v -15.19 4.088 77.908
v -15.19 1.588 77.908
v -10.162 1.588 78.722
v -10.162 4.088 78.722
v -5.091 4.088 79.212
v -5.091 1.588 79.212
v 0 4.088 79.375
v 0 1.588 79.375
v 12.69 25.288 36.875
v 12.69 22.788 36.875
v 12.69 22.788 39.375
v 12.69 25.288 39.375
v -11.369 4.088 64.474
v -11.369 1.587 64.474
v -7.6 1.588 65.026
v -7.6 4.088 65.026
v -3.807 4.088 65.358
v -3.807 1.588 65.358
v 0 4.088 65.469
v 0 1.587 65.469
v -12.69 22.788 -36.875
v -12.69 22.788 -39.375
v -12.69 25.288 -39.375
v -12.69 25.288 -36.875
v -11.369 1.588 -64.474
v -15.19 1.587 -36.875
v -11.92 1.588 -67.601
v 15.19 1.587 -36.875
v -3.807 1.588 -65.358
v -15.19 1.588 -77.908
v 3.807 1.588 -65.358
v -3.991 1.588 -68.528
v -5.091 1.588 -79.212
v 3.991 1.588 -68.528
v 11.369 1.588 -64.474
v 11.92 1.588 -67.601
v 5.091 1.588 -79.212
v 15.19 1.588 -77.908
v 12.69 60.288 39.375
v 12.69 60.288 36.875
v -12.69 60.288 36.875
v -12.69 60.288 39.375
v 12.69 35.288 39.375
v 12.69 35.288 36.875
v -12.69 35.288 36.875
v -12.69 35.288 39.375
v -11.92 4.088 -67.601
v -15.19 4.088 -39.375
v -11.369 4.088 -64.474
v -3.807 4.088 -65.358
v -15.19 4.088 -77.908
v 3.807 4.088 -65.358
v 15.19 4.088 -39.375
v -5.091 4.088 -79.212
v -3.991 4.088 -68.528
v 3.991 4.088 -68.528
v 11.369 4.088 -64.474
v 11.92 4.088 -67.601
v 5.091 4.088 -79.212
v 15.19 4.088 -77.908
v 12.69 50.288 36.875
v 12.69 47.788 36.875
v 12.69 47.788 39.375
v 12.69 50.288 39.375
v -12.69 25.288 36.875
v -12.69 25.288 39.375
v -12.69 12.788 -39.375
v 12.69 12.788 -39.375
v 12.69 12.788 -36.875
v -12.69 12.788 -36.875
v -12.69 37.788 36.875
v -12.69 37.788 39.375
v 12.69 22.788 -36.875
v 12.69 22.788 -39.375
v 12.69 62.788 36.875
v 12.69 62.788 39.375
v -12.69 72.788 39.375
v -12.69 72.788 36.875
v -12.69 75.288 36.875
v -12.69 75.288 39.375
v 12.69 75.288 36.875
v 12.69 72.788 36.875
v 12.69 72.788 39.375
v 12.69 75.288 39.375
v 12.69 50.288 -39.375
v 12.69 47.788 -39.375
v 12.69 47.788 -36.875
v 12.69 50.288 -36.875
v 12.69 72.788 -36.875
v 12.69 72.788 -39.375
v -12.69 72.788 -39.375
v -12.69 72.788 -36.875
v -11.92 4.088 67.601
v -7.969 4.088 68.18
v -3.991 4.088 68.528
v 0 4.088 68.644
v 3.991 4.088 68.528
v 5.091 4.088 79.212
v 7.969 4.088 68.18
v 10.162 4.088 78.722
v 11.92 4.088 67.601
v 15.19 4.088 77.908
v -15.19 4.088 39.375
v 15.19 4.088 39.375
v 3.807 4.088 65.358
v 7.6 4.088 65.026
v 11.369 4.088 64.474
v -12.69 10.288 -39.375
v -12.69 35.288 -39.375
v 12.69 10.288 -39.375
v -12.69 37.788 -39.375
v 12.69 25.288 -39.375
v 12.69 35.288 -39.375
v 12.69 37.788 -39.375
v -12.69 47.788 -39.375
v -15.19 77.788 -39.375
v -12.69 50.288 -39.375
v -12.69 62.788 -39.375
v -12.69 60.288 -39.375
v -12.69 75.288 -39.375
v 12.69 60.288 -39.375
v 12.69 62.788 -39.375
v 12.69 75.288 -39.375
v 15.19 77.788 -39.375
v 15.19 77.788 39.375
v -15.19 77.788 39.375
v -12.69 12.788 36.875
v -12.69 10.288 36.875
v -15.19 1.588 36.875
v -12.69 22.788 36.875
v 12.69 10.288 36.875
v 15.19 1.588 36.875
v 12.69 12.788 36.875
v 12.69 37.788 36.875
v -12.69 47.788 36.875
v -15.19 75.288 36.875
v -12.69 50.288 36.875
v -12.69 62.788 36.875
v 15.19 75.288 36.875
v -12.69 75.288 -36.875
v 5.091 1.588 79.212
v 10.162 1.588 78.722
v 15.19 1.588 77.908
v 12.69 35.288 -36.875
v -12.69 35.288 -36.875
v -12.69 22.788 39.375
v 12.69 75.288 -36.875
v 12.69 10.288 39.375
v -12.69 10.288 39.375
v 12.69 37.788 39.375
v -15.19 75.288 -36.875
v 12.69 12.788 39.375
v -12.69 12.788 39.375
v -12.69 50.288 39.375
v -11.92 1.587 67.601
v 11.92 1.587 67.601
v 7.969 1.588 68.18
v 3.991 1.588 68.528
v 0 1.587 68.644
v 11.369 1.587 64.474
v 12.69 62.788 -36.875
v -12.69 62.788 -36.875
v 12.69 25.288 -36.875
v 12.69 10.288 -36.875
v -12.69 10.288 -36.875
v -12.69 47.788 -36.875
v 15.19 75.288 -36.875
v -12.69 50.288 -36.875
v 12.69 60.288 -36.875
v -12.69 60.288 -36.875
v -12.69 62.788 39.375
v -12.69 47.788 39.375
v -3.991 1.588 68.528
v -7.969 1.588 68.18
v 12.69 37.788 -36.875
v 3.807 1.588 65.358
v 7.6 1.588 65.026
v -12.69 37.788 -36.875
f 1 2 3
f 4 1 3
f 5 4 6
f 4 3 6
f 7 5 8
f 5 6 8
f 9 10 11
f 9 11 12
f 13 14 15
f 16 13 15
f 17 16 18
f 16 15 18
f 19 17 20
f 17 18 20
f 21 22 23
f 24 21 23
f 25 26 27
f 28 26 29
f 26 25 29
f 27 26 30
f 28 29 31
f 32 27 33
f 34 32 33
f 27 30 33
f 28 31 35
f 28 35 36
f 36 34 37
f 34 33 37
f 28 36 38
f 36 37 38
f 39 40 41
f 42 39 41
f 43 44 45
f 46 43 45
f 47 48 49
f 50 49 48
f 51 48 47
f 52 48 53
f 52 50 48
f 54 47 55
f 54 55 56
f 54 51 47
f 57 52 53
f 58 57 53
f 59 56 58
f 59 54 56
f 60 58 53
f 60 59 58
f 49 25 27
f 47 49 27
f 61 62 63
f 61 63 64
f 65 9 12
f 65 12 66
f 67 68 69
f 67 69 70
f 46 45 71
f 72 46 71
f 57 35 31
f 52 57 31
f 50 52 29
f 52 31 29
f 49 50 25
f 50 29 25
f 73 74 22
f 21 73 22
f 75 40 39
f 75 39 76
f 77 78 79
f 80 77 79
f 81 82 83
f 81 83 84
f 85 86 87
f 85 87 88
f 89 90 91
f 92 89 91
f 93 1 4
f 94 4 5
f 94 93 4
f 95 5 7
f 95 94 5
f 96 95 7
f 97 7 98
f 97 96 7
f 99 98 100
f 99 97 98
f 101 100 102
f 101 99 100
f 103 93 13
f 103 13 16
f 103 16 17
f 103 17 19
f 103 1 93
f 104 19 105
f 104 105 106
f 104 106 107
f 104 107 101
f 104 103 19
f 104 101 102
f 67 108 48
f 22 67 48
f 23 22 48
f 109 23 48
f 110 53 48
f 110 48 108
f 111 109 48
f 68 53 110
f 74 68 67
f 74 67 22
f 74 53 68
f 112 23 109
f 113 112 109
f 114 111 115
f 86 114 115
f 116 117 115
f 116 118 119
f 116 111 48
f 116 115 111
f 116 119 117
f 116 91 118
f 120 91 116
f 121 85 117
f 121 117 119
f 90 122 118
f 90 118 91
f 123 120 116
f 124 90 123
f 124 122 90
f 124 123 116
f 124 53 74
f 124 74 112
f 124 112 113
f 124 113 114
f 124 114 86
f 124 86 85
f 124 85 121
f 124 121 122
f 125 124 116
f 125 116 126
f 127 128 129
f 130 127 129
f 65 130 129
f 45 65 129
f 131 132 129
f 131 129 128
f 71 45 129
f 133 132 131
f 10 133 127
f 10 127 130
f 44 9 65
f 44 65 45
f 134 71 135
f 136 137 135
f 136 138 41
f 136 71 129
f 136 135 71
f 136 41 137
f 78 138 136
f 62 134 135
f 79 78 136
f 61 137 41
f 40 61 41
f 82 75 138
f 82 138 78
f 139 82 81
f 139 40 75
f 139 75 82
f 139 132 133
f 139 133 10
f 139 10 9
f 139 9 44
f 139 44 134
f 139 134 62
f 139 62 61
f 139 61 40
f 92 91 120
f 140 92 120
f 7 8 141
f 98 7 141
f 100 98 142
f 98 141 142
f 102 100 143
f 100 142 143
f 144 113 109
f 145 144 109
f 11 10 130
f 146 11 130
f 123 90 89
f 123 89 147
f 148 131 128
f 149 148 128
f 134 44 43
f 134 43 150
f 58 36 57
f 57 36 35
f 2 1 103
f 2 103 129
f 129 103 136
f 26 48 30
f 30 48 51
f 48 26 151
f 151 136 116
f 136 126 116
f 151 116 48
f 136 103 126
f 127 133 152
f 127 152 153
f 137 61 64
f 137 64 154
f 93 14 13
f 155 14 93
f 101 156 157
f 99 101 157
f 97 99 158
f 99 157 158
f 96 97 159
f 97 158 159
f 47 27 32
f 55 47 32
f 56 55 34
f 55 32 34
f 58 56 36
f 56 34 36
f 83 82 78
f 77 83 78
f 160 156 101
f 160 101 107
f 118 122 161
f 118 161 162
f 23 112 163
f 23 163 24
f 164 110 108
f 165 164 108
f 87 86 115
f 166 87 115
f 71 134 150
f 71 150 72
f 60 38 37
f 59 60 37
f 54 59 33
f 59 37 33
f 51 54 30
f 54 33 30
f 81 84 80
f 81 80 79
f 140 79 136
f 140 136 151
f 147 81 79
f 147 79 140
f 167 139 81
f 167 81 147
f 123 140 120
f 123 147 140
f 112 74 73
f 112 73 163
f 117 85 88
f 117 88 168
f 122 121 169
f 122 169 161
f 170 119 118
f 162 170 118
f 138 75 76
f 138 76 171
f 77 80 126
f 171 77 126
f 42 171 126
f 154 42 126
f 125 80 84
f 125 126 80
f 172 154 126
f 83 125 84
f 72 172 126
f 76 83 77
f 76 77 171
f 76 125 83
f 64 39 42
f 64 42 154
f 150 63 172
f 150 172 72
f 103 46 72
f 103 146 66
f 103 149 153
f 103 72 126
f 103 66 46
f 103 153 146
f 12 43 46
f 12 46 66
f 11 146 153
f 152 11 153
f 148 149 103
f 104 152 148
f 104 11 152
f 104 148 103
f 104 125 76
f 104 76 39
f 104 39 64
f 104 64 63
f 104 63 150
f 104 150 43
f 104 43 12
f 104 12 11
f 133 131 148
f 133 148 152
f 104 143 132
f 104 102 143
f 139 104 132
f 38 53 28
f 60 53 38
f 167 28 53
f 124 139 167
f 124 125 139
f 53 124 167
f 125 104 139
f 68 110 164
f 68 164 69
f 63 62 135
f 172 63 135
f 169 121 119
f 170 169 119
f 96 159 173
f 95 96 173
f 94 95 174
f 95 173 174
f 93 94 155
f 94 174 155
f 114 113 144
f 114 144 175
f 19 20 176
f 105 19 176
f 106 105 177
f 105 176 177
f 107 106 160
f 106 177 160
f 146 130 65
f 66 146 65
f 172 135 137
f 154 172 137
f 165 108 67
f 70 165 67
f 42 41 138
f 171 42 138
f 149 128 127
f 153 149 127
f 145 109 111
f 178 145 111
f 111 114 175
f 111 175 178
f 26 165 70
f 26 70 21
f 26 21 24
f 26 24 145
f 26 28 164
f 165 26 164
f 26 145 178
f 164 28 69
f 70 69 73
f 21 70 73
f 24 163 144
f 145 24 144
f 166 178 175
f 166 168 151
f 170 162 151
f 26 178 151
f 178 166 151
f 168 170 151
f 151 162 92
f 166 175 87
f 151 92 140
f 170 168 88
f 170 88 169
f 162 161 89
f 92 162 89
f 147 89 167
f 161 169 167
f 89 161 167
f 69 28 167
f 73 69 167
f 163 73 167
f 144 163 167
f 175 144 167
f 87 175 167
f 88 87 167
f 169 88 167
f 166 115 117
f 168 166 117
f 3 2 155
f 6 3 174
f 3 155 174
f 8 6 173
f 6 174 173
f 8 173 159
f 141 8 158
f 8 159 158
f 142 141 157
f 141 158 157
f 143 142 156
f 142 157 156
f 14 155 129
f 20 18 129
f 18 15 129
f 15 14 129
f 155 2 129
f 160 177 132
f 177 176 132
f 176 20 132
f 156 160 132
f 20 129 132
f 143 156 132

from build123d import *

# Parameters (mm, degrees)
SKETCH1_R            = 1.5875
BOSS_EXTRUDE5_DEPTH  = 1.5875
FILLET2_R            = 2.54
FILLET3_R            = 2.54
FILLET4_R            = 5.08
CUT_EXTRUDE1_START   = -2.54
SKETCH2_R            = 2.38125
SKETCH2_R_2          = 1.5875
CUT_EXTRUDE1_DEPTH   = 2.54
SKETCH3_R            = 1.5875
CUT_EXTRUDE2_DEPTH   = 2.54
CUT_EXTRUDE3_DEPTH   = 2.54
SKETCH5_W            = 15
SKETCH5_H            = 34.925
CUT_EXTRUDE4_DEPTH   = 109.650407999
FILLET5_R            = 7.62
FILLET6_R            = 7.62
BOSS_EXTRUDE6_START  = -1.5875
BOSS_EXTRUDE6_DEPTH  = 1.5875
SKETCH7_R            = 79.375
CUT_EXTRUDE5_DEPTH   = 0.5875
BOSS_EXTRUDE7_START  = -1
SKETCH8_R            = 1.5875
SKETCH8_R_2          = 2.38125
BOSS_EXTRUDE7_DEPTH  = 1
SKETCH9_R            = 1.5875
CUT_EXTRUDE7_DEPTH   = 2.54
BOSS_EXTRUDE8_START  = -1
BOSS_EXTRUDE8_DEPTH  = 1
CUT_EXTRUDE9_START   = -2.54
CUT_EXTRUDE9_DEPTH   = 2.54
BOSS_EXTRUDE9_START  = -1
BOSS_EXTRUDE9_DEPTH  = 1
CUT_EXTRUDE10_START  = -2.54
CUT_EXTRUDE10_DEPTH  = 2.54
BOSS_EXTRUDE10_START = -1
BOSS_EXTRUDE10_DEPTH = 1
CUT_EXTRUDE11_START  = -2.54
CUT_EXTRUDE11_DEPTH  = 2.54
BOSS_EXTRUDE11_START = -1
BOSS_EXTRUDE11_DEPTH = 1
BOSS_EXTRUDE13_DEPTH = 2.5
SKETCH19_W           = 73.75
SKETCH19_H           = 2.5
SKETCH19_W_2         = 2.5
SKETCH19_H_2         = 76.2
BOSS_EXTRUDE14_DEPTH = 30.380450628
CUT_EXTRUDE12_START  = -2.5
SKETCH20_R           = 79.375
CUT_EXTRUDE12_DEPTH  = 2.5
SKETCH21_W           = 25.380450628
SKETCH21_H           = 2.5
CUT_EXTRUDE15_DEPTH  = 143.7697468


with BuildPart() as part:
    # Sketch1 → Boss-Extrude5 (new body)
    with BuildSketch(Plane(origin=(0, 0, 0), x_dir=(1, 0, 0), z_dir=(0, 1, 0))):
        with BuildLine():
            ThreePointArc((-63.5, -47.625), (-35.497579143, -70.995158286), (0, -79.375))
            ThreePointArc((0, -79.375), (35.497579143, -70.995158286), (63.5, -47.625))
            Line((63.5, -47.625), (50.8, -47.625))
            Line((50.8, -47.625), (50.8, 22.225))
            Line((50.8, 22.225), (76.2, 22.225))
            ThreePointArc((76.2, 22.225), (0, 79.375), (-76.2, 22.225))
            Line((-76.2, 22.225), (-50.8, 22.225))
            Line((-50.8, 22.225), (-50.8, -47.625))
            Line((-50.8, -47.625), (-63.5, -47.625))
        make_face()
        with Locations(Location((-7.14375, -66.675, 0), (0, 0, 270))):
            Circle(SKETCH1_R, mode=Mode.SUBTRACT)
        with BuildLine():
            ThreePointArc((8.73125, -66.675), (7.14375, -68.2625), (5.55625, -66.675))
            ThreePointArc((5.55625, -66.675), (7.14375, -65.0875), (8.73125, -66.675))
        make_face(mode=Mode.SUBTRACT)
        with Locations(Location((-7.14375, 66.675, 0), (0, 0, 270))):
            Circle(SKETCH1_R, mode=Mode.SUBTRACT)
        with Locations(Location((7.14375, 66.675, 0), (0, 0, 270))):
            Circle(SKETCH1_R, mode=Mode.SUBTRACT)
    extrude(amount=BOSS_EXTRUDE5_DEPTH)

    # Fillet2
    fillet2_edges = [part.edges().sort_by_distance(p)[0] for p in [
        (-63.5, 0.79375, 47.625),
    ]]
    fillet(fillet2_edges, radius=FILLET2_R)

    # Fillet3
    fillet3_edges = [part.edges().sort_by_distance(p)[0] for p in [
        (63.5, 0.79375, 47.625),
    ]]
    fillet(fillet3_edges, radius=FILLET3_R)

    # Fillet4
    fillet4_edges = [part.edges().sort_by_distance(p)[0] for p in [
        (-76.2, 0.79375, -22.225),
        (76.2, 0.79375, -22.225),
    ]]
    fillet(fillet4_edges, radius=FILLET4_R)

    # Sketch2 → Cut-Extrude1 (cut)
    # profile 1 of 10: a face of its own
    with BuildSketch(Plane(origin=(0, 1.5875, 0), x_dir=(1, 0, 0), z_dir=(0, 1, 0)).offset(CUT_EXTRUDE1_START)):
        with BuildLine():
            Line((-61.088622125, 27.654457796), (-59.642408406, 26.999765402))
            ThreePointArc((-59.642408406, 26.999765402), (-52.384826382, 39.268743005), (-42.643785254, 49.676068599))
            Line((-42.643785254, 49.676068599), (-43.677815048, 50.880617741))
            Line((-43.677815048, 50.880617741), (-44.711844841, 52.085166883))
            ThreePointArc((-44.711844841, 52.085166883), (-54.925289002, 41.173126022), (-62.534835843, 28.309150189))
            Line((-62.534835843, 28.309150189), (-61.088622125, 27.654457796))
        make_face()
    # profile 2 of 10: a face of its own
    with BuildSketch(Plane(origin=(0, 1.5875, 0), x_dir=(1, 0, 0), z_dir=(0, 1, 0)).offset(CUT_EXTRUDE1_START)):
        with BuildLine():
            Line((-39.077069744, 54.493774041), (-38.151958122, 53.203686937))
            ThreePointArc((-38.151958122, 53.203686937), (-25.732218917, 60.200142208), (-12.092567045, 64.342629994))
            Line((-12.092567045, 64.342629994), (-12.385788543, 65.902815048))
            Line((-12.385788543, 65.902815048), (-12.679010041, 67.463000102))
            ThreePointArc((-12.679010041, 67.463000102), (-26.980132574, 63.119617589), (-40.002181367, 55.783861145))
            Line((-40.002181367, 55.783861145), (-39.077069744, 54.493774041))
        make_face()
    # profile 3 of 10: a face of its own
    with BuildSketch(Plane(origin=(0, 1.5875, 0), x_dir=(1, 0, 0), z_dir=(0, 1, 0)).offset(CUT_EXTRUDE1_START)):
        with Locations(Location((-7.14375, 66.675, 0), (0, 0, 270))):
            Circle(SKETCH2_R)
        with Locations((-7.14375, 66.675)):
            Circle(SKETCH2_R_2, mode=Mode.SUBTRACT)
    # profile 4 of 10: a face of its own
    with BuildSketch(Plane(origin=(0, 1.5875, 0), x_dir=(1, 0, 0), z_dir=(0, 1, 0)).offset(CUT_EXTRUDE1_START)):
        with Locations(Location((7.14375, 66.675, 0), (0, 0, 270))):
            Circle(SKETCH2_R)
        with Locations((7.14375, 66.675)):
            Circle(SKETCH2_R_2, mode=Mode.SUBTRACT)
    # profile 5 of 10: a face of its own
    with BuildSketch(Plane(origin=(0, 1.5875, 0), x_dir=(1, 0, 0), z_dir=(0, 1, 0)).offset(CUT_EXTRUDE1_START)):
        with BuildLine():
            ThreePointArc((12.679010041, 67.463000102), (26.980132574, 63.119617589), (40.002181367, 55.783861145))
            Line((40.002181367, 55.783861145), (39.077069744, 54.493774041))
            Line((39.077069744, 54.493774041), (38.151958122, 53.203686937))
            ThreePointArc((38.151958122, 53.203686937), (25.732218917, 60.200142208), (12.092567045, 64.342629994))
            Line((12.092567045, 64.342629994), (12.385788543, 65.902815048))
            Line((12.385788543, 65.902815048), (12.679010041, 67.463000102))
        make_face()
    # profile 6 of 10: a face of its own
    with BuildSketch(Plane(origin=(0, 1.5875, 0), x_dir=(1, 0, 0), z_dir=(0, 1, 0)).offset(CUT_EXTRUDE1_START)):
        with BuildLine():
            ThreePointArc((44.711844841, 52.085166883), (54.925289002, 41.173126022), (62.534835843, 28.309150189))
            Line((62.534835843, 28.309150189), (59.642408406, 26.999765402))
            ThreePointArc((59.642408406, 26.999765402), (52.384826382, 39.268743005), (42.643785254, 49.676068599))
            Line((42.643785254, 49.676068599), (43.677815048, 50.880617741))
            Line((43.677815048, 50.880617741), (44.711844841, 52.085166883))
        make_face()
    # profile 7 of 10: a face of its own
    with BuildSketch(Plane(origin=(0, 1.5875, 0), x_dir=(1, 0, 0), z_dir=(0, 1, 0)).offset(CUT_EXTRUDE1_START)):
        with BuildLine():
            ThreePointArc((-12.679010041, -67.463000102), (-26.980132574, -63.119617589), (-40.002181367, -55.783861145))
            Line((-40.002181367, -55.783861145), (-39.077069744, -54.493774041))
            Line((-39.077069744, -54.493774041), (-38.151958122, -53.203686937))
            ThreePointArc((-38.151958122, -53.203686937), (-25.732218917, -60.200142208), (-12.092567045, -64.342629994))
            Line((-12.092567045, -64.342629994), (-12.385788543, -65.902815048))
            Line((-12.385788543, -65.902815048), (-12.679010041, -67.463000102))
        make_face()
    # profile 8 of 10: a face of its own
    with BuildSketch(Plane(origin=(0, 1.5875, 0), x_dir=(1, 0, 0), z_dir=(0, 1, 0)).offset(CUT_EXTRUDE1_START)):
        with Locations(Location((-7.14375, -66.675, 0), (0, 0, 270))):
            Circle(SKETCH2_R)
        with Locations((-7.14375, -66.675)):
            Circle(SKETCH2_R_2, mode=Mode.SUBTRACT)
    # profile 9 of 10: a face of its own
    with BuildSketch(Plane(origin=(0, 1.5875, 0), x_dir=(1, 0, 0), z_dir=(0, 1, 0)).offset(CUT_EXTRUDE1_START)):
        with Locations(Location((7.14375, -66.675, 0), (0, 0, 270))):
            Circle(SKETCH2_R)
        with Locations((7.14375, -66.675)):
            Circle(SKETCH2_R_2, mode=Mode.SUBTRACT)
    # profile 10 of 10: a face of its own
    with BuildSketch(Plane(origin=(0, 1.5875, 0), x_dir=(1, 0, 0), z_dir=(0, 1, 0)).offset(CUT_EXTRUDE1_START)):
        with BuildLine():
            ThreePointArc((12.092567045, -64.342629994), (25.732218917, -60.200142208), (38.151958122, -53.203686937))
            Line((38.151958122, -53.203686937), (39.077069744, -54.493774041))
            Line((39.077069744, -54.493774041), (40.002181367, -55.783861145))
            ThreePointArc((40.002181367, -55.783861145), (26.980132574, -63.119617589), (12.679010041, -67.463000102))
            Line((12.679010041, -67.463000102), (12.385788543, -65.902815048))
            Line((12.385788543, -65.902815048), (12.092567045, -64.342629994))
        make_face()
    extrude(amount=CUT_EXTRUDE1_DEPTH, mode=Mode.SUBTRACT)

    # Sketch3 → Cut-Extrude2 (cut)
    with BuildSketch(Plane(origin=(0, 1.5875, 0), x_dir=(1, 0, 0), z_dir=(0, 1, 0))):
        with Locations(Location((-44.45, -47.625, 0), (0, 0, 270))):
            Circle(SKETCH3_R)
        with Locations(Location((-44.45, 22.225, 0), (0, 0, 270))):
            Circle(SKETCH3_R)
        with Locations(Location((44.45, 22.225, 0), (0, 0, 270))):
            Circle(SKETCH3_R)
        with Locations(Location((44.45, -47.625, 0), (0, 0, 270))):
            Circle(SKETCH3_R)
    extrude(amount=-CUT_EXTRUDE2_DEPTH, mode=Mode.SUBTRACT)

    # Sketch4 → Cut-Extrude3 (cut)
    with BuildSketch(Plane(origin=(0, 1.5875, 0), x_dir=(1, 0, 0), z_dir=(0, 1, 0))):
        with BuildLine():
            ThreePointArc((-44.45, -11.1125), (-46.0375, -12.7), (-44.45, -14.2875))
            Line((-44.45, -14.2875), (-44.45, -11.1125))
        make_face()
        with BuildLine():
            Line((-44.45, -11.1125), (-44.45, -14.2875))
            ThreePointArc((-44.45, -14.2875), (-43.327467985, -13.822532015), (-42.8625, -12.7))
            ThreePointArc((-42.8625, -12.7), (-43.327467985, -11.577467985), (-44.45, -11.1125))
        make_face()
        with BuildLine():
            ThreePointArc((44.45, -11.1125), (42.8625, -12.7), (44.45, -14.2875))
            Line((44.45, -14.2875), (44.45, -11.1125))
        make_face()
        with BuildLine():
            Line((44.45, -11.1125), (44.45, -14.2875))
            ThreePointArc((44.45, -14.2875), (45.572532015, -13.822532015), (46.0375, -12.7))
            ThreePointArc((46.0375, -12.7), (45.572532015, -11.577467985), (44.45, -11.1125))
        make_face()
    extrude(amount=-CUT_EXTRUDE3_DEPTH, mode=Mode.SUBTRACT)

    # Sketch5 → Cut-Extrude4 (cut, through all)
    with BuildSketch(Plane(origin=(0, 1.5875, 0), x_dir=(1, 0, 0), z_dir=(0, 1, 0))):
        with Locations((-27.3, 4.7625)):
            Rectangle(SKETCH5_W, SKETCH5_H)
        with Locations((27.3, 4.7625)):
            Rectangle(SKETCH5_W, SKETCH5_H)
    extrude(amount=-CUT_EXTRUDE4_DEPTH, mode=Mode.SUBTRACT)

    # Fillet5
    # the kernel refuses this fillet: 7.62 mm, written as the material it adds along each edge
    with BuildSketch(Plane(origin=(-19.8, 1.5875, 12.7), x_dir=(0, 0, -1), z_dir=(0, -1, 0))) as fillet5_piece_1:
        with BuildLine():
            CenterArc((FILLET5_R, -FILLET5_R), FILLET5_R, 90, 90)
            Line((0, -FILLET5_R), (0, 0))
            Line((0, 0), (FILLET5_R, 0))
        make_face()
    extrude(amount=1.5875)
    with BuildSketch(Plane(origin=(-34.8, 1.5875, 12.7), x_dir=(0, 0, -1), z_dir=(0, -1, 0)), Plane(origin=(-19.8, 1.5875, -22.225), x_dir=(0, 0, 1), z_dir=(0, -1, 0)), Plane(origin=(-34.8, 1.5875, -22.225), x_dir=(1, 0, 0), z_dir=(0, -1, 0))) as fillet5_piece_2:
        with BuildLine():
            CenterArc((FILLET5_R, FILLET5_R), FILLET5_R, 180, 90)
            Line((0, FILLET5_R), (0, 0))
            Line((0, 0), (FILLET5_R, 0))
        make_face()
    extrude(amount=1.5875)

    # Fillet6
    # the kernel refuses this fillet: 7.62 mm, written as the material it adds along each edge
    with BuildSketch(Plane(origin=(34.8, 1.5875, 12.7), x_dir=(0, 0, -1), z_dir=(0, -1, 0)), Plane(origin=(34.8, 1.5875, -22.225), x_dir=(-1, 0, 0), z_dir=(0, -1, 0))) as fillet6_piece_1:
        with BuildLine():
            CenterArc((FILLET6_R, -FILLET6_R), FILLET6_R, 90, 90)
            Line((0, -FILLET6_R), (0, 0))
            Line((0, 0), (FILLET6_R, 0))
        make_face()
    extrude(amount=1.5875)
    with BuildSketch(Plane(origin=(19.8, 1.5875, -22.225), x_dir=(1, 0, 0), z_dir=(0, -1, 0)), Plane(origin=(19.8, 1.5875, 12.7), x_dir=(0, 0, -1), z_dir=(0, -1, 0))) as fillet6_piece_2:
        with BuildLine():
            CenterArc((FILLET6_R, FILLET6_R), FILLET6_R, 180, 90)
            Line((0, FILLET6_R), (0, 0))
            Line((0, 0), (FILLET6_R, 0))
        make_face()
    extrude(amount=1.5875)

    # Sketch6 → Boss-Extrude6 (add)
    with BuildSketch(Plane(origin=(0, 1.5875, 0), x_dir=(1, 0, 0), z_dir=(0, 1, 0)).offset(BOSS_EXTRUDE6_START)):
        with BuildLine():
            Line((-50.8, -60.989758362), (-50.8, 22.225))
            Line((-50.8, 22.225), (-69.095470184, 22.225))
            Line((-69.095470184, 22.225), (-69.095470184, 39.066694575))
            ThreePointArc((-69.095470184, 39.066694575), (-78.080435361, -14.277122916), (-50.8, -60.989758362))
        make_face()
        with BuildLine():
            Line((50.8, 22.225), (50.8, -60.989758362))
            ThreePointArc((50.8, -60.989758362), (71.877119534, -33.675960454), (79.375, 0))
            ThreePointArc((79.375, 0), (76.762111653, 20.198238526), (69.095470184, 39.066694575))
            Line((69.095470184, 39.066694575), (69.095470184, 22.225))
            Line((69.095470184, 22.225), (50.8, 22.225))
        make_face()
    extrude(amount=BOSS_EXTRUDE6_DEPTH)

    # Sketch7 → Cut-Extrude5 (cut)
    with BuildSketch(Plane.XZ):
        with Locations(Location((0, 0, 0), (0, 0, 270))):
            Circle(SKETCH7_R)
    extrude(amount=-CUT_EXTRUDE5_DEPTH, mode=Mode.SUBTRACT)

    # Sketch8 → Boss-Extrude7 (add)
    with BuildSketch(Plane(origin=(0, 1.5875, 0), x_dir=(1, 0, 0), z_dir=(0, 1, 0)).offset(BOSS_EXTRUDE7_START)):
        with Locations((-44.45, -12.7)):
            Circle(SKETCH8_R)
        with Locations((44.45, -12.7)):
            Circle(SKETCH8_R)
        with Locations((-7.14375, -66.675)):
            Circle(SKETCH8_R_2)
        with Locations((7.14375, -66.675)):
            Circle(SKETCH8_R_2)
        with Locations((-7.14375, 66.675)):
            Circle(SKETCH8_R_2)
        with Locations((7.14375, 66.675)):
            Circle(SKETCH8_R_2)
    extrude(amount=BOSS_EXTRUDE7_DEPTH)

    # Sketch9 → Cut-Extrude7 (cut)
    with BuildSketch(Plane(origin=(0, 1.5875, 0), x_dir=(1, 0, 0), z_dir=(0, 1, 0))):
        with Locations(Location((-44.45, -1.058333333, 0), (0, 0, 270))):
            Circle(SKETCH9_R)
        with Locations(Location((-44.45, -24.341666667, 0), (0, 0, 270))):
            Circle(SKETCH9_R)
        with Locations(Location((44.45, -24.341666667, 0), (0, 0, 270))):
            Circle(SKETCH9_R)
        with Locations(Location((44.45, -1.058333333, 0), (0, 0, 270))):
            Circle(SKETCH9_R)
    extrude(amount=-CUT_EXTRUDE7_DEPTH, mode=Mode.SUBTRACT)

    # Sketch10 → Boss-Extrude8 (add)
    with BuildSketch(Plane(origin=(0, 1.5875, 0), x_dir=(1, 0, 0), z_dir=(0, 1, 0)).offset(BOSS_EXTRUDE8_START)):
        with BuildLine():
            Line((-44.711844841, 52.085166883), (-42.643785254, 49.676068599))
            ThreePointArc((-42.643785254, 49.676068599), (-52.384826382, 39.268743005), (-59.642408406, 26.999765402))
            Line((-59.642408406, 26.999765402), (-62.534835843, 28.309150189))
            ThreePointArc((-62.534835843, 28.309150189), (-54.925289002, 41.173126022), (-44.711844841, 52.085166883))
        make_face()
        with BuildLine():
            Line((-12.679010041, 67.463000102), (-12.092567045, 64.342629994))
            ThreePointArc((-12.092567045, 64.342629994), (-25.732218917, 60.200142208), (-38.151958122, 53.203686937))
            Line((-38.151958122, 53.203686937), (-40.002181367, 55.783861145))
            ThreePointArc((-40.002181367, 55.783861145), (-26.980132574, 63.119617589), (-12.679010041, 67.463000102))
        make_face()
        with BuildLine():
            Line((12.092567045, 64.342629994), (12.679010041, 67.463000102))
            ThreePointArc((12.679010041, 67.463000102), (26.980132574, 63.119617589), (40.002181367, 55.783861145))
            Line((40.002181367, 55.783861145), (38.151958122, 53.203686937))
            ThreePointArc((38.151958122, 53.203686937), (25.732218917, 60.200142208), (12.092567045, 64.342629994))
        make_face()
        with BuildLine():
            Line((42.643785254, 49.676068599), (44.711844841, 52.085166883))
            ThreePointArc((44.711844841, 52.085166883), (54.925289002, 41.173126022), (62.534835843, 28.309150189))
            Line((62.534835843, 28.309150189), (59.642408406, 26.999765402))
            ThreePointArc((59.642408406, 26.999765402), (52.384826382, 39.268743005), (42.643785254, 49.676068599))
        make_face()
    extrude(amount=BOSS_EXTRUDE8_DEPTH)

    # Sketch11 → Cut-Extrude9 (cut)
    with BuildSketch(Plane(origin=(0, 1.5875, 0), x_dir=(1, 0, 0), z_dir=(0, 1, 0)).offset(CUT_EXTRUDE9_START)):
        with BuildLine():
            Line((11.919924408, -67.601250584), (11.368591443, -64.474485968))
            ThreePointArc((11.368591443, -64.474485968), (0, -65.46910884), (-11.368591443, -64.474485968))
            Line((-11.368591443, -64.474485968), (-11.919924408, -67.601250584))
            ThreePointArc((-11.919924408, -67.601250584), (0, -68.64410884), (11.919924408, -67.601250584))
        make_face()
        with BuildLine():
            Line((-11.919924408, 67.601250584), (-11.368591443, 64.474485968))
            ThreePointArc((-11.368591443, 64.474485968), (0, 65.46910884), (11.368591443, 64.474485968))
            Line((11.368591443, 64.474485968), (11.919924408, 67.601250584))
            ThreePointArc((11.919924408, 67.601250584), (0, 68.64410884), (-11.919924408, 67.601250584))
        make_face()
        with BuildLine():
            Line((-48.538714849, 48.538714849), (-46.293650819, 46.293650819))
            ThreePointArc((-46.293650819, 46.293650819), (-42.082731979, 50.152247023), (-37.551538139, 53.629154344))
            Line((-37.551538139, 53.629154344), (-39.372643325, 56.229962084))
            ThreePointArc((-39.372643325, 56.229962084), (-44.12358264, 52.584438129), (-48.538714849, 48.538714849))
        make_face()
        with BuildLine():
            ThreePointArc((-53.629154344, 37.551538139), (-50.152247023, 42.082731979), (-46.293650819, 46.293650819))
            Line((-46.293650819, 46.293650819), (-48.538714849, 48.538714849))
            ThreePointArc((-48.538714849, 48.538714849), (-52.584438129, 44.12358264), (-56.229962084, 39.372643325))
            Line((-56.229962084, 39.372643325), (-53.629154344, 37.551538139))
        make_face()
        with BuildLine():
            Line((-68.64410884, 0), (-65.46910884, 0))
            ThreePointArc((-65.46910884, 0), (-65.219979115, 5.706008808), (-64.474485968, 11.368591443))
            Line((-64.474485968, 11.368591443), (-67.601250584, 11.919924408))
            ThreePointArc((-67.601250584, 11.919924408), (-68.382897281, 5.982728291), (-68.64410884, 0))
        make_face()
        with BuildLine():
            ThreePointArc((-64.474485968, -11.368591443), (-65.219979115, -5.706008808), (-65.46910884, 0))
            Line((-65.46910884, 0), (-68.64410884, 0))
            ThreePointArc((-68.64410884, 0), (-68.382897281, -5.982728291), (-67.601250584, -11.919924408))
            Line((-67.601250584, -11.919924408), (-64.474485968, -11.368591443))
        make_face()
        with BuildLine():
            Line((67.601250584, 11.919924408), (64.474485968, 11.368591443))
            ThreePointArc((64.474485968, 11.368591443), (65.219979115, 5.706008808), (65.46910884, 0))
            ThreePointArc((65.46910884, 0), (65.219979115, -5.706008808), (64.474485968, -11.368591443))
            Line((64.474485968, -11.368591443), (67.601250584, -11.919924408))
            ThreePointArc((67.601250584, -11.919924408), (68.382897281, -5.982728291), (68.64410884, 0))
            ThreePointArc((68.64410884, 0), (68.382897281, 5.982728291), (67.601250584, 11.919924408))
        make_face()
        with BuildLine():
            Line((48.538714849, 48.538714849), (46.293650819, 46.293650819))
            ThreePointArc((46.293650819, 46.293650819), (50.152247023, 42.082731979), (53.629154344, 37.551538139))
            Line((53.629154344, 37.551538139), (56.229962084, 39.372643325))
            ThreePointArc((56.229962084, 39.372643325), (52.584438129, 44.12358264), (48.538714849, 48.538714849))
        make_face()
        with BuildLine():
            ThreePointArc((37.551538139, 53.629154344), (42.082731979, 50.152247023), (46.293650819, 46.293650819))
            Line((46.293650819, 46.293650819), (48.538714849, 48.538714849))
            ThreePointArc((48.538714849, 48.538714849), (44.12358264, 52.584438129), (39.372643325, 56.229962084))
            Line((39.372643325, 56.229962084), (37.551538139, 53.629154344))
        make_face()
    extrude(amount=CUT_EXTRUDE9_DEPTH, mode=Mode.SUBTRACT)

    # Sketch12 → Boss-Extrude9 (add)
    with BuildSketch(Plane(origin=(0, 1.5875, 0), x_dir=(1, 0, 0), z_dir=(0, 1, 0)).offset(BOSS_EXTRUDE9_START)):
        with BuildLine():
            ThreePointArc((-12.092567045, -64.342629994), (-14.887643702, -63.753919701), (-17.654380884, -63.043850199))
            Line((-17.654380884, -63.043850199), (-18.510550462, -66.101234482))
            ThreePointArc((-18.510550462, -66.101234482), (-15.609637167, -66.845739624), (-12.679010041, -67.463000102))
            Line((-12.679010041, -67.463000102), (-12.092567045, -64.342629994))
        make_face()
        with BuildLine():
            Line((18.510550462, -66.101234482), (17.654380884, -63.043850199))
            ThreePointArc((17.654380884, -63.043850199), (14.887643702, -63.753919701), (12.092567045, -64.342629994))
            Line((12.092567045, -64.342629994), (12.679010041, -67.463000102))
            ThreePointArc((12.679010041, -67.463000102), (15.609637167, -66.845739624), (18.510550462, -66.101234482))
        make_face()
    extrude(amount=BOSS_EXTRUDE9_DEPTH)

    # Sketch13 → Cut-Extrude10 (cut)
    with BuildSketch(Plane(origin=(0, 1.5875, 0), x_dir=(1, 0, 0), z_dir=(0, 1, 0)).offset(CUT_EXTRUDE10_START)):
        with BuildLine():
            Line((-52.584438129, -44.12358264), (-50.152247023, -42.082731979))
            ThreePointArc((-50.152247023, -42.082731979), (-56.697911418, -32.73455442), (-61.520838466, -22.391753989))
            Line((-61.520838466, -22.391753989), (-64.504362537, -23.477667944))
            ThreePointArc((-64.504362537, -23.477667944), (-59.447542075, -34.32205442), (-52.584438129, -44.12358264))
        make_face()
        with BuildLine():
            Line((64.504362537, -23.477667944), (61.520838466, -22.391753989))
            ThreePointArc((61.520838466, -22.391753989), (56.697911418, -32.73455442), (50.152247023, -42.082731979))
            Line((50.152247023, -42.082731979), (52.584438129, -44.12358264))
            ThreePointArc((52.584438129, -44.12358264), (59.447542075, -34.32205442), (64.504362537, -23.477667944))
        make_face()
        with BuildLine():
            Line((52.584438129, 44.12358264), (50.152247023, 42.082731979))
            ThreePointArc((50.152247023, 42.082731979), (56.697911418, 32.73455442), (61.520838466, 22.391753989))
            Line((61.520838466, 22.391753989), (64.504362537, 23.477667944))
            ThreePointArc((64.504362537, 23.477667944), (59.447542075, 34.32205442), (52.584438129, 44.12358264))
        make_face()
        with BuildLine():
            Line((23.477667944, 64.504362537), (22.391753989, 61.520838466))
            ThreePointArc((22.391753989, 61.520838466), (32.73455442, 56.697911418), (42.082731979, 50.152247023))
            Line((42.082731979, 50.152247023), (44.12358264, 52.584438129))
            ThreePointArc((44.12358264, 52.584438129), (34.32205442, 59.447542075), (23.477667944, 64.504362537))
        make_face()
        with BuildLine():
            Line((-44.12358264, 52.584438129), (-42.082731979, 50.152247023))
            ThreePointArc((-42.082731979, 50.152247023), (-32.73455442, 56.697911418), (-22.391753989, 61.520838466))
            Line((-22.391753989, 61.520838466), (-23.477667944, 64.504362537))
            ThreePointArc((-23.477667944, 64.504362537), (-34.32205442, 59.447542075), (-44.12358264, 52.584438129))
        make_face()
        with BuildLine():
            Line((-64.504362537, 23.477667944), (-61.520838466, 22.391753989))
            ThreePointArc((-61.520838466, 22.391753989), (-56.697911418, 32.73455442), (-50.152247023, 42.082731979))
            Line((-50.152247023, 42.082731979), (-52.584438129, 44.12358264))
            ThreePointArc((-52.584438129, 44.12358264), (-59.447542075, 34.32205442), (-64.504362537, 23.477667944))
        make_face()
    extrude(amount=CUT_EXTRUDE10_DEPTH, mode=Mode.SUBTRACT)

    # Sketch15 → Boss-Extrude10 (add)
    with BuildSketch(Plane(origin=(0, 1.5875, 0), x_dir=(1, 0, 0), z_dir=(0, 1, 0)).offset(BOSS_EXTRUDE10_START)):
        with BuildLine():
            Line((-52.584438129, 44.12358264), (-50.152247023, 42.082731979))
            ThreePointArc((-50.152247023, 42.082731979), (-46.293650819, 46.293650819), (-42.082731979, 50.152247023))
            Line((-42.082731979, 50.152247023), (-44.12358264, 52.584438129))
            ThreePointArc((-44.12358264, 52.584438129), (-48.538714849, 48.538714849), (-52.584438129, 44.12358264))
        make_face()
        with BuildLine():
            Line((44.12358264, 52.584438129), (42.082731979, 50.152247023))
            ThreePointArc((42.082731979, 50.152247023), (46.293650819, 46.293650819), (50.152247023, 42.082731979))
            Line((50.152247023, 42.082731979), (52.584438129, 44.12358264))
            ThreePointArc((52.584438129, 44.12358264), (48.538714849, 48.538714849), (44.12358264, 52.584438129))
        make_face()
    extrude(amount=BOSS_EXTRUDE10_DEPTH)

    # Sketch16 → Cut-Extrude11 (cut)
    with BuildSketch(Plane(origin=(0, 1.5875, 0), x_dir=(1, 0, 0), z_dir=(0, 1, 0)).offset(CUT_EXTRUDE11_START)):
        with BuildLine():
            Line((-23.477667944, -64.504362537), (-22.391753989, -61.520838466))
            ThreePointArc((-22.391753989, -61.520838466), (-32.73455442, -56.697911418), (-42.082731979, -50.152247022))
            Line((-42.082731979, -50.152247022), (-44.12358264, -52.584438129))
            ThreePointArc((-44.12358264, -52.584438129), (-34.32205442, -59.447542075), (-23.477667944, -64.504362537))
        make_face()
        with BuildLine():
            ThreePointArc((42.082731979, -50.152247022), (32.73455442, -56.697911418), (22.391753989, -61.520838466))
            Line((22.391753989, -61.520838466), (23.477667944, -64.504362537))
            ThreePointArc((23.477667944, -64.504362537), (34.32205442, -59.447542075), (44.12358264, -52.584438129))
            Line((44.12358264, -52.584438129), (42.082731979, -50.152247022))
        make_face()
    extrude(amount=CUT_EXTRUDE11_DEPTH, mode=Mode.SUBTRACT)

    # Sketch17 → Boss-Extrude11 (add)
    with BuildSketch(Plane(origin=(0, 1.5875, 0), x_dir=(1, 0, 0), z_dir=(0, 1, 0)).offset(BOSS_EXTRUDE11_START)):
        with BuildLine():
            Line((-11.919924408, -67.601250584), (-11.368591443, -64.474485968))
            ThreePointArc((-11.368591443, -64.474485968), (-16.944652234, -63.238303052), (-22.391753989, -61.520838466))
            Line((-22.391753989, -61.520838466), (-23.477667944, -64.504362537))
            ThreePointArc((-23.477667944, -64.504362537), (-17.766402702, -66.305117551), (-11.919924408, -67.601250584))
        make_face()
        with BuildLine():
            ThreePointArc((22.391753989, -61.520838466), (16.944652234, -63.238303052), (11.368591443, -64.474485968))
            Line((11.368591443, -64.474485968), (11.919924408, -67.601250584))
            ThreePointArc((11.919924408, -67.601250584), (17.766402702, -66.305117551), (23.477667944, -64.504362537))
            Line((23.477667944, -64.504362537), (22.391753989, -61.520838466))
        make_face()
    extrude(amount=BOSS_EXTRUDE11_DEPTH)

    # Sketch18 → Boss-Extrude13 (add)
    # profile 1 of 3: a face of its own
    with BuildSketch(Plane(origin=(0, 1.5875, 0), x_dir=(1, 0, 0), z_dir=(0, 1, 0))):
        with BuildLine():
            ThreePointArc((15.190225314, 77.907943625), (0, 79.375), (-15.190225314, 77.907943625))
            Line((-15.190225314, 77.907943625), (-15.190225314, 39.375))
            Line((-15.190225314, 39.375), (0, 39.375))
            Line((0, 39.375), (15.190225314, 39.375))
            Line((15.190225314, 39.375), (15.190225314, 77.907943625))
        make_face()
        with BuildLine():
            Line((11.919924408, 67.601250584), (11.368591443, 64.474485968))
            ThreePointArc((11.368591443, 64.474485968), (0, 65.46910884), (-11.368591443, 64.474485968))
            Line((-11.368591443, 64.474485968), (-11.919924408, 67.601250584))
            ThreePointArc((-11.919924408, 67.601250584), (0, 68.64410884), (11.919924408, 67.601250584))
        make_face(mode=Mode.SUBTRACT)
    # profile 2 of 3: a face of its own
    with BuildSketch(Plane(origin=(0, 1.5875, 0), x_dir=(1, 0, 0), z_dir=(0, 1, 0))):
        with BuildLine():
            Line((-15.190225314, -39.375), (-15.190225314, -77.907943625))
            ThreePointArc((-15.190225314, -77.907943625), (-7.630452141, -79.007384624), (0, -79.375))
            Line((0, -79.375), (0, -68.64410884))
            ThreePointArc((0, -68.64410884), (-5.982728291, -68.382897281), (-11.919924408, -67.601250584))
            Line((-11.919924408, -67.601250584), (-11.368591443, -64.474485968))
            ThreePointArc((-11.368591443, -64.474485968), (-5.706008808, -65.219979115), (0, -65.46910884))
            Line((0, -65.46910884), (0, -39.375))
            Line((0, -39.375), (-15.190225314, -39.375))
        make_face()
    # profile 3 of 3: a face of its own
    with BuildSketch(Plane(origin=(0, 1.5875, 0), x_dir=(1, 0, 0), z_dir=(0, 1, 0))):
        with BuildLine():
            Line((0, -68.64410884), (0, -79.375))
            ThreePointArc((0, -79.375), (7.630452141, -79.007384624), (15.190225314, -77.907943625))
            Line((15.190225314, -77.907943625), (15.190225314, -39.375))
            Line((15.190225314, -39.375), (0, -39.375))
            Line((0, -39.375), (0, -65.46910884))
            ThreePointArc((0, -65.46910884), (5.706008808, -65.219979115), (11.368591443, -64.474485968))
            Line((11.368591443, -64.474485968), (11.919924408, -67.601250584))
            ThreePointArc((11.919924408, -67.601250584), (5.982728291, -68.382897281), (0, -68.64410884))
        make_face()
    extrude(amount=BOSS_EXTRUDE13_DEPTH)

    # Sketch19 → Boss-Extrude14 (add)
    with BuildSketch(Plane(origin=(15.190225314, 0, 0), x_dir=(0, 0, -1), z_dir=(1, 0, 0))):
        Polygon((-39.375, 4.0875), (-39.375, 1.5875), (-36.875, 1.5875), (-36.875, 75.2875), (-36.875, 77.7875), (-39.375, 77.7875), align=None)
        with Locations((0, 76.5375)):
            Rectangle(SKETCH19_W, SKETCH19_H)
        with Locations((38.125, 39.6875)):
            Rectangle(SKETCH19_W_2, SKETCH19_H_2)
    extrude(amount=-BOSS_EXTRUDE14_DEPTH)

    # Sketch20 → Cut-Extrude12 (cut)
    with BuildSketch(Plane(origin=(0, 1.5875, 0), x_dir=(1, 0, 0), z_dir=(0, 1, 0)).offset(CUT_EXTRUDE12_START)):
        Circle(SKETCH20_R)
    extrude(amount=CUT_EXTRUDE12_DEPTH, mode=Mode.SUBTRACT)

    # Sketch21 → Cut-Extrude15 (cut, through all)
    with BuildSketch(Plane(origin=(0, 0, -39.375), x_dir=(-1, 0, 0), z_dir=(0, 0, -1))):
        with Locations((0, 74.0375)):
            Rectangle(SKETCH21_W, SKETCH21_H)
        with Locations((0, 61.5375)):
            Rectangle(SKETCH21_W, SKETCH21_H)
        with Locations((0, 49.0375)):
            Rectangle(SKETCH21_W, SKETCH21_H)
        with Locations((0, 36.5375)):
            Rectangle(SKETCH21_W, SKETCH21_H)
        with Locations((0, 24.0375)):
            Rectangle(SKETCH21_W, SKETCH21_H)
        with Locations((0, 11.5375)):
            Rectangle(SKETCH21_W, SKETCH21_H)
    extrude(amount=-CUT_EXTRUDE15_DEPTH, mode=Mode.SUBTRACT)


solid = part.part
